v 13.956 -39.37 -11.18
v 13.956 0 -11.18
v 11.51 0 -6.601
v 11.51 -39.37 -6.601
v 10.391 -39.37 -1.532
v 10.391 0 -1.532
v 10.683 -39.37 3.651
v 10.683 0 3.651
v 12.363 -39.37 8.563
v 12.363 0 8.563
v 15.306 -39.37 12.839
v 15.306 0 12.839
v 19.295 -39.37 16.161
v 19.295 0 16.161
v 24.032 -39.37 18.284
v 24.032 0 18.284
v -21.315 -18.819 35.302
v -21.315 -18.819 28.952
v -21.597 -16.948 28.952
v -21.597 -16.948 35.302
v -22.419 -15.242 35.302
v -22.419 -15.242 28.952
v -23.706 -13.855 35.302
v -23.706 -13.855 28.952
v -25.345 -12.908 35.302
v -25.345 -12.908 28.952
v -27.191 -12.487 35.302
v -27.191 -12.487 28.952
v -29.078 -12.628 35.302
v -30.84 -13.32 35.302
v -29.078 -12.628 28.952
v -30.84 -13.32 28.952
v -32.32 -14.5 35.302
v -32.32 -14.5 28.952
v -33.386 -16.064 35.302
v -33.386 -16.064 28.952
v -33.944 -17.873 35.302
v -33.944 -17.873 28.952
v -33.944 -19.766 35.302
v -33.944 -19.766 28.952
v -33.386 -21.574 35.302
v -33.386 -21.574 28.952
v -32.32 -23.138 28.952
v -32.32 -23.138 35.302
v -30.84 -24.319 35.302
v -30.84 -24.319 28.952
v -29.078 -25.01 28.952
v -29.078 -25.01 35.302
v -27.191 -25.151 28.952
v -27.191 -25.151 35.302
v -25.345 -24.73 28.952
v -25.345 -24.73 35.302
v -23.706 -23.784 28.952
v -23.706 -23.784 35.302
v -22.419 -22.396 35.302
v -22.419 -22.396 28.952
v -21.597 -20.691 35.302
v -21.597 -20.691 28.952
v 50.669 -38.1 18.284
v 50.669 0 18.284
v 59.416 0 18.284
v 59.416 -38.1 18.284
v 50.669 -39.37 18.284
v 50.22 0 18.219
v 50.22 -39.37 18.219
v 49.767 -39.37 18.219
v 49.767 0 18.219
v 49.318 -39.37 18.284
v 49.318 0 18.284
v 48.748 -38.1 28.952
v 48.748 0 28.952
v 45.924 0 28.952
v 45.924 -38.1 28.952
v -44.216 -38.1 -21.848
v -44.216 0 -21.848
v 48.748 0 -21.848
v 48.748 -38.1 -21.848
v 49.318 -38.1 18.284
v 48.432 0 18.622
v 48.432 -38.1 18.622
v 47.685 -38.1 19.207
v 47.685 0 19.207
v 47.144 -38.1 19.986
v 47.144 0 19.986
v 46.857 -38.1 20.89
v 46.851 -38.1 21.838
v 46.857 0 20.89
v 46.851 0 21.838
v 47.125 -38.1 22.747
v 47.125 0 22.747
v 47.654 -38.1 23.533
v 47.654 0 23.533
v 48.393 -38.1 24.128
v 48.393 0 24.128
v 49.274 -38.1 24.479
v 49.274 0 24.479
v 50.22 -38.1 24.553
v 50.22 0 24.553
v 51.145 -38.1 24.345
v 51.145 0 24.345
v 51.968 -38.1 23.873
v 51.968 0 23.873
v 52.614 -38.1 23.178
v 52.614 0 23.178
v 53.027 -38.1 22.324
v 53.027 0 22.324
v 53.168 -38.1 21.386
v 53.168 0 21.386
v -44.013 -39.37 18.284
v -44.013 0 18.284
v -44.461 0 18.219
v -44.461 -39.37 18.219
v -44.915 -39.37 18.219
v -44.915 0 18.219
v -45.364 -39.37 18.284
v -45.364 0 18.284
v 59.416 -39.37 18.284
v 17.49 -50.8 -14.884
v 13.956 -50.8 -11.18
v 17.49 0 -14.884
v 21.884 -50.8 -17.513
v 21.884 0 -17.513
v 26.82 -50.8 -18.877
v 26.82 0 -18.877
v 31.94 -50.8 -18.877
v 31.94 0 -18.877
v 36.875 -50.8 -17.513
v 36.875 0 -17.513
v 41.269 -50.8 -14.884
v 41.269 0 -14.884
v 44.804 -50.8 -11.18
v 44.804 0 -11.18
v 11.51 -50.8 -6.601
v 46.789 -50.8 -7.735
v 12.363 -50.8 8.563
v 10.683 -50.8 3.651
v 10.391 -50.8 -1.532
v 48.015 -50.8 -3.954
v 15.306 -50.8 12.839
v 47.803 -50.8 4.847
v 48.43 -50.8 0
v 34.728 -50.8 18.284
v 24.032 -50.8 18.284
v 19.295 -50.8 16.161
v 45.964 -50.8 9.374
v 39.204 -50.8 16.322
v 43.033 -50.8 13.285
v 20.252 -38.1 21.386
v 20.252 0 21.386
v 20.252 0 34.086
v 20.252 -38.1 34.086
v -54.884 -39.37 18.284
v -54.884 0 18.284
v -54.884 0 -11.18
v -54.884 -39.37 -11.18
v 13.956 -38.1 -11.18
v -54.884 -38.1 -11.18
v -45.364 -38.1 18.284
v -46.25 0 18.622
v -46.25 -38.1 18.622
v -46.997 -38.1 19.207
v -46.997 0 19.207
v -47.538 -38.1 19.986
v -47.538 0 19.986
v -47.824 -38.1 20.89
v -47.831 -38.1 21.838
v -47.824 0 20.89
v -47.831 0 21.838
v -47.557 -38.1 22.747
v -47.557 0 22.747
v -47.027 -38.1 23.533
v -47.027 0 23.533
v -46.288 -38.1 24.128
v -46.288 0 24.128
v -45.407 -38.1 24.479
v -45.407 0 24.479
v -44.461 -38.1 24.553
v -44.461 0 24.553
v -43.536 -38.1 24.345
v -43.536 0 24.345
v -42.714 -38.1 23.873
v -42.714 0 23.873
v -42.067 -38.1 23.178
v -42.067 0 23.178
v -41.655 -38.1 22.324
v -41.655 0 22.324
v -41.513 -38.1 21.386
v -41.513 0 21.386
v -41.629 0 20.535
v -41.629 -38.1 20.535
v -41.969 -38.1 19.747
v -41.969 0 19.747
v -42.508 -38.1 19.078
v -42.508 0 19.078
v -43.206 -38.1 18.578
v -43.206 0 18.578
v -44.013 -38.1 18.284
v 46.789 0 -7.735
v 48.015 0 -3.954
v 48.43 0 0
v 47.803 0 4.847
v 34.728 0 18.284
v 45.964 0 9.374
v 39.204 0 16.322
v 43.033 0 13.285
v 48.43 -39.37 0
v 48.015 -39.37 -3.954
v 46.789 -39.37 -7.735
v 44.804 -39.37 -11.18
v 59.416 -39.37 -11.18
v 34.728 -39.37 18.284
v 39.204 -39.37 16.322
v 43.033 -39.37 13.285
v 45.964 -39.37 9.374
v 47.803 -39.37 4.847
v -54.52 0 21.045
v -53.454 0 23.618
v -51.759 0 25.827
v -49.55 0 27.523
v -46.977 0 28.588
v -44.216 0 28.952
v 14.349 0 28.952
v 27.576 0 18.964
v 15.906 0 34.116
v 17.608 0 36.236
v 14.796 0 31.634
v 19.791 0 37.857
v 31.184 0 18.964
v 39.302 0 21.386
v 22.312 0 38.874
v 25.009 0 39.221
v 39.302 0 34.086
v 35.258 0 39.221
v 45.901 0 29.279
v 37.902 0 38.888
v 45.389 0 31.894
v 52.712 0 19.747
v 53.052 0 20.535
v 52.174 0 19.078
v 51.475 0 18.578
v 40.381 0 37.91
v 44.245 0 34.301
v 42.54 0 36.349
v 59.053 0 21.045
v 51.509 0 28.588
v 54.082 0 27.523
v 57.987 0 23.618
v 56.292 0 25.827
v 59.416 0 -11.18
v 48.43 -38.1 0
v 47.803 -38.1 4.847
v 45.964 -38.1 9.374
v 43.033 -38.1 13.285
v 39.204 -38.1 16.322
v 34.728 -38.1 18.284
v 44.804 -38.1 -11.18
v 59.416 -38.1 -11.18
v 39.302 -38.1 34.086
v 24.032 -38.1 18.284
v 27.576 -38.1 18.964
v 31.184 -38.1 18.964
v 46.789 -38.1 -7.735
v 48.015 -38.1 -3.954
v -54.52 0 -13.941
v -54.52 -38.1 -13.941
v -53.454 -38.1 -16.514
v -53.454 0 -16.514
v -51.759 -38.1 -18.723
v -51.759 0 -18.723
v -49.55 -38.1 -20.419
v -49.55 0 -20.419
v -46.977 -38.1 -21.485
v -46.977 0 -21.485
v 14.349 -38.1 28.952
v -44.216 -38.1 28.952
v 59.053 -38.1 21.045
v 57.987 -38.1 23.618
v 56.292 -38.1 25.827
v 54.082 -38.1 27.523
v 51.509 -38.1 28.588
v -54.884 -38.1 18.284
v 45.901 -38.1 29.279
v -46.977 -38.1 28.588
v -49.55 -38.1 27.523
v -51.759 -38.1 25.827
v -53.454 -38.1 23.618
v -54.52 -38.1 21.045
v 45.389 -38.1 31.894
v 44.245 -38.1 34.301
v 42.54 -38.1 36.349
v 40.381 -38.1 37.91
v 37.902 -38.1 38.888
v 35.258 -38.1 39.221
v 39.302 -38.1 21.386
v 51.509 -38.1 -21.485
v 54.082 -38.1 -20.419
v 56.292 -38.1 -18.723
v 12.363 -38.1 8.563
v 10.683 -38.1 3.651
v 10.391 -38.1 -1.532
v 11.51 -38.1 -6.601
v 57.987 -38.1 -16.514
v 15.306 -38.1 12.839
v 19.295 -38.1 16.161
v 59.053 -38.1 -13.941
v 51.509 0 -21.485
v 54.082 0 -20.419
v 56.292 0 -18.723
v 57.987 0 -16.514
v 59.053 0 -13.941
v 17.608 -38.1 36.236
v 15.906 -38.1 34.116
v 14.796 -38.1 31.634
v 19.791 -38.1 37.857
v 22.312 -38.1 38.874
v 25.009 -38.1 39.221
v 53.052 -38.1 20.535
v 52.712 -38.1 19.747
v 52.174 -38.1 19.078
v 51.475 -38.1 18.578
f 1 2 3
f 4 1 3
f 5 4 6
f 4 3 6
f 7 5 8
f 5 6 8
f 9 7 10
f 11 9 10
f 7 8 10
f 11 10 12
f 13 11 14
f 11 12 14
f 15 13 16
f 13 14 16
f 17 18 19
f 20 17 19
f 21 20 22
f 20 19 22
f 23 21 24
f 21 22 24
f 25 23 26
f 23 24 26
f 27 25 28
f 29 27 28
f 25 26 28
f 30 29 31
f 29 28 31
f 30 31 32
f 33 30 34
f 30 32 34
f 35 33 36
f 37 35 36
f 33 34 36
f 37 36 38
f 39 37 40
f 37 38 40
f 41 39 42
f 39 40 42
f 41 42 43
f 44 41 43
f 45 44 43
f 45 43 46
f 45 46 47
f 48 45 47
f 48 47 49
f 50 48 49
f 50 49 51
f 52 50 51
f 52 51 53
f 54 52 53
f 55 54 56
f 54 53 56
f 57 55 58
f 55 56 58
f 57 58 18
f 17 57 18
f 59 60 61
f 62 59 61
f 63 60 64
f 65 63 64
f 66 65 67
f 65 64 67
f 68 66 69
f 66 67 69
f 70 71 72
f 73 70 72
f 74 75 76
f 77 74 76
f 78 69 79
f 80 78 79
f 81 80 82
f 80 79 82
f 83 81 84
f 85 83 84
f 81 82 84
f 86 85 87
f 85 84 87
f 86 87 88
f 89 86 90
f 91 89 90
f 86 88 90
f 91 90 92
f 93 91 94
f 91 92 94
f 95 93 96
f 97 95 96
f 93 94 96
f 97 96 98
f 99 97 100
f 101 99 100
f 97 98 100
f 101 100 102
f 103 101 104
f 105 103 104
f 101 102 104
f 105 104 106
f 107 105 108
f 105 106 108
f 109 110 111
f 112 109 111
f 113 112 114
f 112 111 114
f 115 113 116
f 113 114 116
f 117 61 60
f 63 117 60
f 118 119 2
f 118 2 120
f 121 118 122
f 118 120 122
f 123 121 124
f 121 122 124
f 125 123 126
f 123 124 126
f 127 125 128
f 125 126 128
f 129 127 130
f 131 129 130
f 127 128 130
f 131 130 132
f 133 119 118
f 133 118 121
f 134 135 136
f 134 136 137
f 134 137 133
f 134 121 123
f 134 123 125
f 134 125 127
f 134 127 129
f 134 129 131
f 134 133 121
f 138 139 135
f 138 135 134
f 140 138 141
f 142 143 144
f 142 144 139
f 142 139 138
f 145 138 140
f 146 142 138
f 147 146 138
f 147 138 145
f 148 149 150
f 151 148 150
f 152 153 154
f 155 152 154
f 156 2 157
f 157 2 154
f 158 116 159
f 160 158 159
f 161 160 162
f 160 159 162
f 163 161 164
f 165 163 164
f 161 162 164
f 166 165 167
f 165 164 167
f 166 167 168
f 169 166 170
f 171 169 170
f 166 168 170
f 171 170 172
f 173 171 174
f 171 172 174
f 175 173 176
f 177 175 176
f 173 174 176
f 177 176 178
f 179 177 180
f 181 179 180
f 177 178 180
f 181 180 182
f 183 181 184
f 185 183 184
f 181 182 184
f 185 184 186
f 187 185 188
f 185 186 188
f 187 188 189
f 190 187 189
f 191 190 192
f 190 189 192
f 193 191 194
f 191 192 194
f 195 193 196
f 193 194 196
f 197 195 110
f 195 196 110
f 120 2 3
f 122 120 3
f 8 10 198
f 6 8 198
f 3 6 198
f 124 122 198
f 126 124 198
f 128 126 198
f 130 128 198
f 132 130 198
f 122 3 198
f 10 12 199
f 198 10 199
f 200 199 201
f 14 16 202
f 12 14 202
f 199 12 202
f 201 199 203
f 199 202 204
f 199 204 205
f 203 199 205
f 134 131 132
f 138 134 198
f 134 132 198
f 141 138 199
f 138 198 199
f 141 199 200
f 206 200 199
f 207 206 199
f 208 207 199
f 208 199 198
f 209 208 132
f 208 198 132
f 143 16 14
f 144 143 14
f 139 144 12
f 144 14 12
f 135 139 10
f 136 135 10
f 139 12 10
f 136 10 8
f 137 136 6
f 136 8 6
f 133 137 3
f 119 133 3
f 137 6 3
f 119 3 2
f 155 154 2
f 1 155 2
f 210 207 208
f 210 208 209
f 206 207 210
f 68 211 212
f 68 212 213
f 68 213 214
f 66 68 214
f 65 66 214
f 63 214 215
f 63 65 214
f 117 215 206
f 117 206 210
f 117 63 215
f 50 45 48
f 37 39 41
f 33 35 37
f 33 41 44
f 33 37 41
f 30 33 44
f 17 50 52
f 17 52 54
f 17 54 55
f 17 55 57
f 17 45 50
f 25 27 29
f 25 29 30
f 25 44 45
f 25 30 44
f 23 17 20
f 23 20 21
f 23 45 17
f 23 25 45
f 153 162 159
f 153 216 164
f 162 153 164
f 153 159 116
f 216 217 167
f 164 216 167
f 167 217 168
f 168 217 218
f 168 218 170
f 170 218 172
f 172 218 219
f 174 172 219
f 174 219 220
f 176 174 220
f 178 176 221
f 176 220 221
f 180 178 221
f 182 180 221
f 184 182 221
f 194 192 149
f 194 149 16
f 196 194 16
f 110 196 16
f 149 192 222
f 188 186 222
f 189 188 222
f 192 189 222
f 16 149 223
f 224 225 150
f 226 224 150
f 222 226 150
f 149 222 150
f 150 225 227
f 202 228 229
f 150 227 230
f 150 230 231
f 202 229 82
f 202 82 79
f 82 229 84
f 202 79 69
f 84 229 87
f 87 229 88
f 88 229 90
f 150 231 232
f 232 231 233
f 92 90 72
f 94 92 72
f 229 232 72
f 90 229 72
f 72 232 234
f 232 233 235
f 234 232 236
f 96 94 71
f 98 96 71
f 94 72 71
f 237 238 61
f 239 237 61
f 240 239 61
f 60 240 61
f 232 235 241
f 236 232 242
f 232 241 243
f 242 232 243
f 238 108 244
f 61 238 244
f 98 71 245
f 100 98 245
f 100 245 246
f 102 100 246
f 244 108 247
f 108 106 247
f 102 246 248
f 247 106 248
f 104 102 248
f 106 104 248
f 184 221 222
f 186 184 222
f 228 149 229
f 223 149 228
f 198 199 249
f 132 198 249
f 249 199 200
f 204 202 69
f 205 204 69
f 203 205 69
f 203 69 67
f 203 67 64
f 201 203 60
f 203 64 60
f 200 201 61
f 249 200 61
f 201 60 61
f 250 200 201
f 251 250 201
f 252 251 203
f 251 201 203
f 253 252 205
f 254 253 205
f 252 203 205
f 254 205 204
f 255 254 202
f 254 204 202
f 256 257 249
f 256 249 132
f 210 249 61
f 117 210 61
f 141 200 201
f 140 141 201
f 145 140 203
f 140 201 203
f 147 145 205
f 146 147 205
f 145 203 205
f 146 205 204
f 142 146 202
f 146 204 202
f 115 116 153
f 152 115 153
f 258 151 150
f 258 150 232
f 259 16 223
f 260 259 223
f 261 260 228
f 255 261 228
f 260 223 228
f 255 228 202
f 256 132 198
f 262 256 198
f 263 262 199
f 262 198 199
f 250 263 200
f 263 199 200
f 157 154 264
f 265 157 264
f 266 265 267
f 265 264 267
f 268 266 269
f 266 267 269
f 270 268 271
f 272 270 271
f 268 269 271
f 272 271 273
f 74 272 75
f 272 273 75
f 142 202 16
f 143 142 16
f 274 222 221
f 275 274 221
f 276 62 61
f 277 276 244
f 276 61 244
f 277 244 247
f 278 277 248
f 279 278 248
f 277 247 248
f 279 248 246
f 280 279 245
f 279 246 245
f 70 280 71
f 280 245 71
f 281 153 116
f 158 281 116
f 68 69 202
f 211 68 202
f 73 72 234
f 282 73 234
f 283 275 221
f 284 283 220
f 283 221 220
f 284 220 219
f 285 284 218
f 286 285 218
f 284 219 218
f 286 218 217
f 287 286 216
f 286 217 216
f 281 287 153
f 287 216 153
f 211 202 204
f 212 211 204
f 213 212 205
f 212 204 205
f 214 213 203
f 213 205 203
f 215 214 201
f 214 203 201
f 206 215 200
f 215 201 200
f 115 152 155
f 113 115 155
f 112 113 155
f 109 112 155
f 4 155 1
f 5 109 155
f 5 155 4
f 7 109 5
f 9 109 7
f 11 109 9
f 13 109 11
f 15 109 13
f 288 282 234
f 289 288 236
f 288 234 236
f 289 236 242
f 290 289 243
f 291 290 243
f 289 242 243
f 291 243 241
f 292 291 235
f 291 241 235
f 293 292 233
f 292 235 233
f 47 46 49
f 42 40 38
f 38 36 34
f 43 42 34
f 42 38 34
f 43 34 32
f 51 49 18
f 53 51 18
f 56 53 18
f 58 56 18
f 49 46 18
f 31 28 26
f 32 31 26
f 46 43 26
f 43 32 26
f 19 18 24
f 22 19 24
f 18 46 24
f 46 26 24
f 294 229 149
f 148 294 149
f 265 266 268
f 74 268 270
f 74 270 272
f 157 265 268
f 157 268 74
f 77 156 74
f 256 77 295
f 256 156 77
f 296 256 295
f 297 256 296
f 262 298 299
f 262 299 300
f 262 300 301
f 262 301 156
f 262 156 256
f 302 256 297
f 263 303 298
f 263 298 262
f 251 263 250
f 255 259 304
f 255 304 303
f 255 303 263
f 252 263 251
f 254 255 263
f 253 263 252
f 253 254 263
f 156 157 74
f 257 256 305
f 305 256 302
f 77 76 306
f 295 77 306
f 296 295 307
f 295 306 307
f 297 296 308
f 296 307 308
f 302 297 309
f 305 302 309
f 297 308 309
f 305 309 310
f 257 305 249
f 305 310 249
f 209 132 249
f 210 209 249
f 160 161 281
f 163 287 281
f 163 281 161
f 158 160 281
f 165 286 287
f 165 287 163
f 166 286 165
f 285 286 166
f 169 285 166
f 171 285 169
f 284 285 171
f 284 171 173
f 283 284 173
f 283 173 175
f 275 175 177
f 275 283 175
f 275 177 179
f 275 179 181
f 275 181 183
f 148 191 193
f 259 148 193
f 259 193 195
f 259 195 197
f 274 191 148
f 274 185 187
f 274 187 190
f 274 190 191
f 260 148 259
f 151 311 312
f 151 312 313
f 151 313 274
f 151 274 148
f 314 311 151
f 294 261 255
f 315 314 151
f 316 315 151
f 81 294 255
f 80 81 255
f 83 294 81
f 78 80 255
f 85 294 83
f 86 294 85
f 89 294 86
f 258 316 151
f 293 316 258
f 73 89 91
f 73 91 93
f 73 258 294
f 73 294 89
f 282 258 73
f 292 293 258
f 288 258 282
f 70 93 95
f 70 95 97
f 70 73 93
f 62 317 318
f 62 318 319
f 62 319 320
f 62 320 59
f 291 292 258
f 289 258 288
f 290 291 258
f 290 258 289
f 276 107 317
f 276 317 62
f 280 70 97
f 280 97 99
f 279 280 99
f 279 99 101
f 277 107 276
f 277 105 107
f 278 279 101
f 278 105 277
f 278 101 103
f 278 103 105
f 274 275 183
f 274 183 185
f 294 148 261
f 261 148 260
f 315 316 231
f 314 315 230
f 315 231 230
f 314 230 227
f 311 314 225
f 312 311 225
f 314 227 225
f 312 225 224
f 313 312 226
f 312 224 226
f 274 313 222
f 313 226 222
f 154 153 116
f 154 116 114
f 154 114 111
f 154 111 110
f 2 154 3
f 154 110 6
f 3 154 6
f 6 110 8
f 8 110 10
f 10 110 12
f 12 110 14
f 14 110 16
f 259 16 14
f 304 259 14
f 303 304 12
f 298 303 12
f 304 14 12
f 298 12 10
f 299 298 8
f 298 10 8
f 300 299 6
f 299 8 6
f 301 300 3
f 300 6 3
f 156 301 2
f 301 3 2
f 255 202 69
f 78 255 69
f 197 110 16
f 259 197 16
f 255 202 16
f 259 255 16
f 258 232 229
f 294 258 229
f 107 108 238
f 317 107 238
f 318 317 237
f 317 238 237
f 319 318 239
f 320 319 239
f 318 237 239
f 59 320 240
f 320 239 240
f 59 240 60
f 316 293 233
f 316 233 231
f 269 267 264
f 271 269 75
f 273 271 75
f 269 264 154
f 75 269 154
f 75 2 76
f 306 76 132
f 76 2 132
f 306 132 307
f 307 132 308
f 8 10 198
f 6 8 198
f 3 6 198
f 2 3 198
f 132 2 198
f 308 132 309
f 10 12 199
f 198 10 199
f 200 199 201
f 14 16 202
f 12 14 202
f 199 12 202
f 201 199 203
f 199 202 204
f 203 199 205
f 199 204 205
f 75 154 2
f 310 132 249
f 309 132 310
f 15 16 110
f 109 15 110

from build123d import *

# Parameters (mm, degrees)
F0_W     = 7.701499
F0_H     = 3.708132
F1_DEPTH = 38.1
F2_DEPTH = 50.8
F3_R     = 6.35
F4_DEPTH = 6.35
F5_DEPTH = 34.29
F6_DEPTH = 39.37
F7_DEPTH = 34.29
F8_DEPTH = 38.1
F9_DEPTH = 38.1


with BuildPart() as f1:
    # F0 (on Front) → F1 (new body)
    with BuildSketch(Plane.XZ):
        with BuildLine():
            Line((14.348516, 28.951926), (14.282982, 28.951926))
            Line((14.282982, 28.951926), (14.369692, 27.77123))
            ThreePointArc((14.369692, 27.77123), (14.342755, 28.361285), (14.348516, 28.951926))
        make_face()
        with BuildLine():
            Line((13.955504, -11.180074), (-54.883698, -11.180074))
            ThreePointArc((-54.883698, -11.180074), (-51.759113, -18.723489), (-44.215698, -21.848074))
            Line((-44.215698, -21.848074), (48.748302, -21.848074))
            ThreePointArc((48.748302, -21.848074), (56.291717, -18.723489), (59.416302, -11.180074))
            Line((59.416302, -11.180074), (44.804066, -11.180074))
            ThreePointArc((44.804066, -11.180074), (29.379785, -19.05), (13.955504, -11.180074))
        make_face()
        with BuildLine():
            Line((14.282982, 28.951926), (-44.215698, 28.951926))
            ThreePointArc((-44.215698, 28.951926), (-51.759113, 25.827341), (-54.883698, 18.283926))
            Line((-54.883698, 18.283926), (-45.363535, 18.283926))
            ThreePointArc((-45.363535, 18.283926), (-46.680146, 23.858607), (-41.513134, 21.386257))
            ThreePointArc((-41.513134, 21.386257), (-42.215785, 19.394245), (-44.012733, 18.283926))
            Line((-44.012733, 18.283926), (24.031837, 18.283926))
            ThreePointArc((24.031837, 18.283926), (29.379785, 19.05), (34.727733, 18.283926))
            Line((34.727733, 18.283926), (49.318015, 18.283926))
            ThreePointArc((49.318015, 18.283926), (48.001404, 23.858607), (53.168416, 21.386257))
            ThreePointArc((53.168416, 21.386257), (52.465766, 19.394245), (50.668818, 18.283926))
            Line((50.668818, 18.283926), (59.416302, 18.283926))
            ThreePointArc((59.416302, 18.283926), (56.291717, 25.827341), (48.748302, 28.951926))
            Line((48.748302, 28.951926), (45.923743, 28.951926))
            Line((45.923743, 28.951926), (39.302086, 28.951926))
            Line((39.302086, 28.951926), (39.302086, 21.386257))
            Line((39.302086, 21.386257), (20.252086, 21.386257))
            Line((20.252086, 21.386257), (20.252086, 28.951926))
            Line((20.252086, 28.951926), (14.348516, 28.951926))
            ThreePointArc((14.348516, 28.951926), (14.342755, 28.361285), (14.369692, 27.77123))
            Line((14.369692, 27.77123), (14.282982, 28.951926))
        make_face()
        with Locations((3.85075, 23.960214)):
            Rectangle(F0_W, F0_H, mode=Mode.SUBTRACT)
        with BuildLine():
            ThreePointArc((24.031837, 18.283926), (11.354714, 6.164358), (13.955504, -11.180074))
            ThreePointArc((13.955504, -11.180074), (29.379785, -19.05), (44.804066, -11.180074))
            ThreePointArc((44.804066, -11.180074), (47.500699, -5.876646), (48.429785, 0))
            ThreePointArc((48.429785, 0), (44.624143, 11.424187), (34.727733, 18.283926))
            Line((34.727733, 18.283926), (24.031837, 18.283926))
        make_face()
        with Locations((3.85075, 23.960214)):
            Rectangle(F0_W, F0_H)
    extrude(amount=F1_DEPTH)

    # F0 (on Front) → F5 (join)
    with BuildSketch(Plane.XZ):
        with Locations((3.85075, 23.960214)):
            Rectangle(F0_W, F0_H)
    extrude(amount=F5_DEPTH)

    # F0 (on Front) → F7 (join)
    with BuildSketch(Plane.XZ):
        with Locations((3.85075, 23.960214)):
            Rectangle(F0_W, F0_H)
    extrude(amount=F7_DEPTH)

    # F0 (on Front) → F8 (join)
    with BuildSketch(Plane.XZ):
        with Locations((3.85075, 23.960214)):
            Rectangle(F0_W, F0_H)
    extrude(amount=F8_DEPTH)

    # F0 (on Front) → F9 (join)
    with BuildSketch(Plane.XZ):
        with BuildLine():
            ThreePointArc((25.009039, 39.220588), (17.608158, 36.235894), (14.348516, 28.951926))
            Line((14.348516, 28.951926), (20.252086, 28.951926))
            Line((20.252086, 28.951926), (20.252086, 34.086257))
            Line((20.252086, 34.086257), (39.302086, 34.086257))
            Line((39.302086, 34.086257), (39.302086, 28.951926))
            Line((39.302086, 28.951926), (45.923743, 28.951926))
            Line((45.923743, 28.951926), (45.901395, 29.279252))
            ThreePointArc((45.901395, 29.279252), (42.540143, 36.348686), (35.258173, 39.220588))
            Line((35.258173, 39.220588), (25.009039, 39.220588))
        make_face()
    extrude(amount=F9_DEPTH)


with BuildPart() as f2:
    # F0 (on Front) → F2 (new body)
    with BuildSketch(Plane.XZ):
        with BuildLine():
            ThreePointArc((24.031837, 18.283926), (11.354714, 6.164358), (13.955504, -11.180074))
            ThreePointArc((13.955504, -11.180074), (29.379785, -19.05), (44.804066, -11.180074))
            ThreePointArc((44.804066, -11.180074), (47.500699, -5.876646), (48.429785, 0))
            ThreePointArc((48.429785, 0), (44.624143, 11.424187), (34.727733, 18.283926))
            Line((34.727733, 18.283926), (24.031837, 18.283926))
        make_face()
    extrude(amount=F2_DEPTH)


with BuildPart() as f4:
    # F3 (on face) → F4 (new body)
    with BuildSketch(Plane.XY.offset(28.951926)):
        with Locations((-27.665122, -18.819248)):
            Circle(F3_R)
    extrude(amount=F4_DEPTH)


with BuildPart() as f6:
    # F0 (on Front) → F6 (new body)
    with BuildSketch(Plane.XZ):
        with BuildLine():
            Line((-45.363535, 18.283926), (-54.883698, 18.283926))
            Line((-54.883698, 18.283926), (-54.883698, -11.180074))
            Line((-54.883698, -11.180074), (13.955504, -11.180074))
            ThreePointArc((13.955504, -11.180074), (11.354714, 6.164358), (24.031837, 18.283926))
            Line((24.031837, 18.283926), (-44.012733, 18.283926))
            ThreePointArc((-44.012733, 18.283926), (-44.688134, 18.211257), (-45.363535, 18.283926))
        make_face()
        with BuildLine():
            ThreePointArc((48.429785, 0), (47.500699, -5.876646), (44.804066, -11.180074))
            Line((44.804066, -11.180074), (59.416302, -11.180074))
            Line((59.416302, -11.180074), (59.416302, 18.283926))
            Line((59.416302, 18.283926), (50.668818, 18.283926))
            ThreePointArc((50.668818, 18.283926), (49.993416, 18.211257), (49.318015, 18.283926))
            Line((49.318015, 18.283926), (34.727733, 18.283926))
            ThreePointArc((34.727733, 18.283926), (44.624143, 11.424187), (48.429785, 0))
        make_face()
    extrude(amount=F6_DEPTH)


solid = Compound([f1.part, f2.part, f4.part, f6.part])
